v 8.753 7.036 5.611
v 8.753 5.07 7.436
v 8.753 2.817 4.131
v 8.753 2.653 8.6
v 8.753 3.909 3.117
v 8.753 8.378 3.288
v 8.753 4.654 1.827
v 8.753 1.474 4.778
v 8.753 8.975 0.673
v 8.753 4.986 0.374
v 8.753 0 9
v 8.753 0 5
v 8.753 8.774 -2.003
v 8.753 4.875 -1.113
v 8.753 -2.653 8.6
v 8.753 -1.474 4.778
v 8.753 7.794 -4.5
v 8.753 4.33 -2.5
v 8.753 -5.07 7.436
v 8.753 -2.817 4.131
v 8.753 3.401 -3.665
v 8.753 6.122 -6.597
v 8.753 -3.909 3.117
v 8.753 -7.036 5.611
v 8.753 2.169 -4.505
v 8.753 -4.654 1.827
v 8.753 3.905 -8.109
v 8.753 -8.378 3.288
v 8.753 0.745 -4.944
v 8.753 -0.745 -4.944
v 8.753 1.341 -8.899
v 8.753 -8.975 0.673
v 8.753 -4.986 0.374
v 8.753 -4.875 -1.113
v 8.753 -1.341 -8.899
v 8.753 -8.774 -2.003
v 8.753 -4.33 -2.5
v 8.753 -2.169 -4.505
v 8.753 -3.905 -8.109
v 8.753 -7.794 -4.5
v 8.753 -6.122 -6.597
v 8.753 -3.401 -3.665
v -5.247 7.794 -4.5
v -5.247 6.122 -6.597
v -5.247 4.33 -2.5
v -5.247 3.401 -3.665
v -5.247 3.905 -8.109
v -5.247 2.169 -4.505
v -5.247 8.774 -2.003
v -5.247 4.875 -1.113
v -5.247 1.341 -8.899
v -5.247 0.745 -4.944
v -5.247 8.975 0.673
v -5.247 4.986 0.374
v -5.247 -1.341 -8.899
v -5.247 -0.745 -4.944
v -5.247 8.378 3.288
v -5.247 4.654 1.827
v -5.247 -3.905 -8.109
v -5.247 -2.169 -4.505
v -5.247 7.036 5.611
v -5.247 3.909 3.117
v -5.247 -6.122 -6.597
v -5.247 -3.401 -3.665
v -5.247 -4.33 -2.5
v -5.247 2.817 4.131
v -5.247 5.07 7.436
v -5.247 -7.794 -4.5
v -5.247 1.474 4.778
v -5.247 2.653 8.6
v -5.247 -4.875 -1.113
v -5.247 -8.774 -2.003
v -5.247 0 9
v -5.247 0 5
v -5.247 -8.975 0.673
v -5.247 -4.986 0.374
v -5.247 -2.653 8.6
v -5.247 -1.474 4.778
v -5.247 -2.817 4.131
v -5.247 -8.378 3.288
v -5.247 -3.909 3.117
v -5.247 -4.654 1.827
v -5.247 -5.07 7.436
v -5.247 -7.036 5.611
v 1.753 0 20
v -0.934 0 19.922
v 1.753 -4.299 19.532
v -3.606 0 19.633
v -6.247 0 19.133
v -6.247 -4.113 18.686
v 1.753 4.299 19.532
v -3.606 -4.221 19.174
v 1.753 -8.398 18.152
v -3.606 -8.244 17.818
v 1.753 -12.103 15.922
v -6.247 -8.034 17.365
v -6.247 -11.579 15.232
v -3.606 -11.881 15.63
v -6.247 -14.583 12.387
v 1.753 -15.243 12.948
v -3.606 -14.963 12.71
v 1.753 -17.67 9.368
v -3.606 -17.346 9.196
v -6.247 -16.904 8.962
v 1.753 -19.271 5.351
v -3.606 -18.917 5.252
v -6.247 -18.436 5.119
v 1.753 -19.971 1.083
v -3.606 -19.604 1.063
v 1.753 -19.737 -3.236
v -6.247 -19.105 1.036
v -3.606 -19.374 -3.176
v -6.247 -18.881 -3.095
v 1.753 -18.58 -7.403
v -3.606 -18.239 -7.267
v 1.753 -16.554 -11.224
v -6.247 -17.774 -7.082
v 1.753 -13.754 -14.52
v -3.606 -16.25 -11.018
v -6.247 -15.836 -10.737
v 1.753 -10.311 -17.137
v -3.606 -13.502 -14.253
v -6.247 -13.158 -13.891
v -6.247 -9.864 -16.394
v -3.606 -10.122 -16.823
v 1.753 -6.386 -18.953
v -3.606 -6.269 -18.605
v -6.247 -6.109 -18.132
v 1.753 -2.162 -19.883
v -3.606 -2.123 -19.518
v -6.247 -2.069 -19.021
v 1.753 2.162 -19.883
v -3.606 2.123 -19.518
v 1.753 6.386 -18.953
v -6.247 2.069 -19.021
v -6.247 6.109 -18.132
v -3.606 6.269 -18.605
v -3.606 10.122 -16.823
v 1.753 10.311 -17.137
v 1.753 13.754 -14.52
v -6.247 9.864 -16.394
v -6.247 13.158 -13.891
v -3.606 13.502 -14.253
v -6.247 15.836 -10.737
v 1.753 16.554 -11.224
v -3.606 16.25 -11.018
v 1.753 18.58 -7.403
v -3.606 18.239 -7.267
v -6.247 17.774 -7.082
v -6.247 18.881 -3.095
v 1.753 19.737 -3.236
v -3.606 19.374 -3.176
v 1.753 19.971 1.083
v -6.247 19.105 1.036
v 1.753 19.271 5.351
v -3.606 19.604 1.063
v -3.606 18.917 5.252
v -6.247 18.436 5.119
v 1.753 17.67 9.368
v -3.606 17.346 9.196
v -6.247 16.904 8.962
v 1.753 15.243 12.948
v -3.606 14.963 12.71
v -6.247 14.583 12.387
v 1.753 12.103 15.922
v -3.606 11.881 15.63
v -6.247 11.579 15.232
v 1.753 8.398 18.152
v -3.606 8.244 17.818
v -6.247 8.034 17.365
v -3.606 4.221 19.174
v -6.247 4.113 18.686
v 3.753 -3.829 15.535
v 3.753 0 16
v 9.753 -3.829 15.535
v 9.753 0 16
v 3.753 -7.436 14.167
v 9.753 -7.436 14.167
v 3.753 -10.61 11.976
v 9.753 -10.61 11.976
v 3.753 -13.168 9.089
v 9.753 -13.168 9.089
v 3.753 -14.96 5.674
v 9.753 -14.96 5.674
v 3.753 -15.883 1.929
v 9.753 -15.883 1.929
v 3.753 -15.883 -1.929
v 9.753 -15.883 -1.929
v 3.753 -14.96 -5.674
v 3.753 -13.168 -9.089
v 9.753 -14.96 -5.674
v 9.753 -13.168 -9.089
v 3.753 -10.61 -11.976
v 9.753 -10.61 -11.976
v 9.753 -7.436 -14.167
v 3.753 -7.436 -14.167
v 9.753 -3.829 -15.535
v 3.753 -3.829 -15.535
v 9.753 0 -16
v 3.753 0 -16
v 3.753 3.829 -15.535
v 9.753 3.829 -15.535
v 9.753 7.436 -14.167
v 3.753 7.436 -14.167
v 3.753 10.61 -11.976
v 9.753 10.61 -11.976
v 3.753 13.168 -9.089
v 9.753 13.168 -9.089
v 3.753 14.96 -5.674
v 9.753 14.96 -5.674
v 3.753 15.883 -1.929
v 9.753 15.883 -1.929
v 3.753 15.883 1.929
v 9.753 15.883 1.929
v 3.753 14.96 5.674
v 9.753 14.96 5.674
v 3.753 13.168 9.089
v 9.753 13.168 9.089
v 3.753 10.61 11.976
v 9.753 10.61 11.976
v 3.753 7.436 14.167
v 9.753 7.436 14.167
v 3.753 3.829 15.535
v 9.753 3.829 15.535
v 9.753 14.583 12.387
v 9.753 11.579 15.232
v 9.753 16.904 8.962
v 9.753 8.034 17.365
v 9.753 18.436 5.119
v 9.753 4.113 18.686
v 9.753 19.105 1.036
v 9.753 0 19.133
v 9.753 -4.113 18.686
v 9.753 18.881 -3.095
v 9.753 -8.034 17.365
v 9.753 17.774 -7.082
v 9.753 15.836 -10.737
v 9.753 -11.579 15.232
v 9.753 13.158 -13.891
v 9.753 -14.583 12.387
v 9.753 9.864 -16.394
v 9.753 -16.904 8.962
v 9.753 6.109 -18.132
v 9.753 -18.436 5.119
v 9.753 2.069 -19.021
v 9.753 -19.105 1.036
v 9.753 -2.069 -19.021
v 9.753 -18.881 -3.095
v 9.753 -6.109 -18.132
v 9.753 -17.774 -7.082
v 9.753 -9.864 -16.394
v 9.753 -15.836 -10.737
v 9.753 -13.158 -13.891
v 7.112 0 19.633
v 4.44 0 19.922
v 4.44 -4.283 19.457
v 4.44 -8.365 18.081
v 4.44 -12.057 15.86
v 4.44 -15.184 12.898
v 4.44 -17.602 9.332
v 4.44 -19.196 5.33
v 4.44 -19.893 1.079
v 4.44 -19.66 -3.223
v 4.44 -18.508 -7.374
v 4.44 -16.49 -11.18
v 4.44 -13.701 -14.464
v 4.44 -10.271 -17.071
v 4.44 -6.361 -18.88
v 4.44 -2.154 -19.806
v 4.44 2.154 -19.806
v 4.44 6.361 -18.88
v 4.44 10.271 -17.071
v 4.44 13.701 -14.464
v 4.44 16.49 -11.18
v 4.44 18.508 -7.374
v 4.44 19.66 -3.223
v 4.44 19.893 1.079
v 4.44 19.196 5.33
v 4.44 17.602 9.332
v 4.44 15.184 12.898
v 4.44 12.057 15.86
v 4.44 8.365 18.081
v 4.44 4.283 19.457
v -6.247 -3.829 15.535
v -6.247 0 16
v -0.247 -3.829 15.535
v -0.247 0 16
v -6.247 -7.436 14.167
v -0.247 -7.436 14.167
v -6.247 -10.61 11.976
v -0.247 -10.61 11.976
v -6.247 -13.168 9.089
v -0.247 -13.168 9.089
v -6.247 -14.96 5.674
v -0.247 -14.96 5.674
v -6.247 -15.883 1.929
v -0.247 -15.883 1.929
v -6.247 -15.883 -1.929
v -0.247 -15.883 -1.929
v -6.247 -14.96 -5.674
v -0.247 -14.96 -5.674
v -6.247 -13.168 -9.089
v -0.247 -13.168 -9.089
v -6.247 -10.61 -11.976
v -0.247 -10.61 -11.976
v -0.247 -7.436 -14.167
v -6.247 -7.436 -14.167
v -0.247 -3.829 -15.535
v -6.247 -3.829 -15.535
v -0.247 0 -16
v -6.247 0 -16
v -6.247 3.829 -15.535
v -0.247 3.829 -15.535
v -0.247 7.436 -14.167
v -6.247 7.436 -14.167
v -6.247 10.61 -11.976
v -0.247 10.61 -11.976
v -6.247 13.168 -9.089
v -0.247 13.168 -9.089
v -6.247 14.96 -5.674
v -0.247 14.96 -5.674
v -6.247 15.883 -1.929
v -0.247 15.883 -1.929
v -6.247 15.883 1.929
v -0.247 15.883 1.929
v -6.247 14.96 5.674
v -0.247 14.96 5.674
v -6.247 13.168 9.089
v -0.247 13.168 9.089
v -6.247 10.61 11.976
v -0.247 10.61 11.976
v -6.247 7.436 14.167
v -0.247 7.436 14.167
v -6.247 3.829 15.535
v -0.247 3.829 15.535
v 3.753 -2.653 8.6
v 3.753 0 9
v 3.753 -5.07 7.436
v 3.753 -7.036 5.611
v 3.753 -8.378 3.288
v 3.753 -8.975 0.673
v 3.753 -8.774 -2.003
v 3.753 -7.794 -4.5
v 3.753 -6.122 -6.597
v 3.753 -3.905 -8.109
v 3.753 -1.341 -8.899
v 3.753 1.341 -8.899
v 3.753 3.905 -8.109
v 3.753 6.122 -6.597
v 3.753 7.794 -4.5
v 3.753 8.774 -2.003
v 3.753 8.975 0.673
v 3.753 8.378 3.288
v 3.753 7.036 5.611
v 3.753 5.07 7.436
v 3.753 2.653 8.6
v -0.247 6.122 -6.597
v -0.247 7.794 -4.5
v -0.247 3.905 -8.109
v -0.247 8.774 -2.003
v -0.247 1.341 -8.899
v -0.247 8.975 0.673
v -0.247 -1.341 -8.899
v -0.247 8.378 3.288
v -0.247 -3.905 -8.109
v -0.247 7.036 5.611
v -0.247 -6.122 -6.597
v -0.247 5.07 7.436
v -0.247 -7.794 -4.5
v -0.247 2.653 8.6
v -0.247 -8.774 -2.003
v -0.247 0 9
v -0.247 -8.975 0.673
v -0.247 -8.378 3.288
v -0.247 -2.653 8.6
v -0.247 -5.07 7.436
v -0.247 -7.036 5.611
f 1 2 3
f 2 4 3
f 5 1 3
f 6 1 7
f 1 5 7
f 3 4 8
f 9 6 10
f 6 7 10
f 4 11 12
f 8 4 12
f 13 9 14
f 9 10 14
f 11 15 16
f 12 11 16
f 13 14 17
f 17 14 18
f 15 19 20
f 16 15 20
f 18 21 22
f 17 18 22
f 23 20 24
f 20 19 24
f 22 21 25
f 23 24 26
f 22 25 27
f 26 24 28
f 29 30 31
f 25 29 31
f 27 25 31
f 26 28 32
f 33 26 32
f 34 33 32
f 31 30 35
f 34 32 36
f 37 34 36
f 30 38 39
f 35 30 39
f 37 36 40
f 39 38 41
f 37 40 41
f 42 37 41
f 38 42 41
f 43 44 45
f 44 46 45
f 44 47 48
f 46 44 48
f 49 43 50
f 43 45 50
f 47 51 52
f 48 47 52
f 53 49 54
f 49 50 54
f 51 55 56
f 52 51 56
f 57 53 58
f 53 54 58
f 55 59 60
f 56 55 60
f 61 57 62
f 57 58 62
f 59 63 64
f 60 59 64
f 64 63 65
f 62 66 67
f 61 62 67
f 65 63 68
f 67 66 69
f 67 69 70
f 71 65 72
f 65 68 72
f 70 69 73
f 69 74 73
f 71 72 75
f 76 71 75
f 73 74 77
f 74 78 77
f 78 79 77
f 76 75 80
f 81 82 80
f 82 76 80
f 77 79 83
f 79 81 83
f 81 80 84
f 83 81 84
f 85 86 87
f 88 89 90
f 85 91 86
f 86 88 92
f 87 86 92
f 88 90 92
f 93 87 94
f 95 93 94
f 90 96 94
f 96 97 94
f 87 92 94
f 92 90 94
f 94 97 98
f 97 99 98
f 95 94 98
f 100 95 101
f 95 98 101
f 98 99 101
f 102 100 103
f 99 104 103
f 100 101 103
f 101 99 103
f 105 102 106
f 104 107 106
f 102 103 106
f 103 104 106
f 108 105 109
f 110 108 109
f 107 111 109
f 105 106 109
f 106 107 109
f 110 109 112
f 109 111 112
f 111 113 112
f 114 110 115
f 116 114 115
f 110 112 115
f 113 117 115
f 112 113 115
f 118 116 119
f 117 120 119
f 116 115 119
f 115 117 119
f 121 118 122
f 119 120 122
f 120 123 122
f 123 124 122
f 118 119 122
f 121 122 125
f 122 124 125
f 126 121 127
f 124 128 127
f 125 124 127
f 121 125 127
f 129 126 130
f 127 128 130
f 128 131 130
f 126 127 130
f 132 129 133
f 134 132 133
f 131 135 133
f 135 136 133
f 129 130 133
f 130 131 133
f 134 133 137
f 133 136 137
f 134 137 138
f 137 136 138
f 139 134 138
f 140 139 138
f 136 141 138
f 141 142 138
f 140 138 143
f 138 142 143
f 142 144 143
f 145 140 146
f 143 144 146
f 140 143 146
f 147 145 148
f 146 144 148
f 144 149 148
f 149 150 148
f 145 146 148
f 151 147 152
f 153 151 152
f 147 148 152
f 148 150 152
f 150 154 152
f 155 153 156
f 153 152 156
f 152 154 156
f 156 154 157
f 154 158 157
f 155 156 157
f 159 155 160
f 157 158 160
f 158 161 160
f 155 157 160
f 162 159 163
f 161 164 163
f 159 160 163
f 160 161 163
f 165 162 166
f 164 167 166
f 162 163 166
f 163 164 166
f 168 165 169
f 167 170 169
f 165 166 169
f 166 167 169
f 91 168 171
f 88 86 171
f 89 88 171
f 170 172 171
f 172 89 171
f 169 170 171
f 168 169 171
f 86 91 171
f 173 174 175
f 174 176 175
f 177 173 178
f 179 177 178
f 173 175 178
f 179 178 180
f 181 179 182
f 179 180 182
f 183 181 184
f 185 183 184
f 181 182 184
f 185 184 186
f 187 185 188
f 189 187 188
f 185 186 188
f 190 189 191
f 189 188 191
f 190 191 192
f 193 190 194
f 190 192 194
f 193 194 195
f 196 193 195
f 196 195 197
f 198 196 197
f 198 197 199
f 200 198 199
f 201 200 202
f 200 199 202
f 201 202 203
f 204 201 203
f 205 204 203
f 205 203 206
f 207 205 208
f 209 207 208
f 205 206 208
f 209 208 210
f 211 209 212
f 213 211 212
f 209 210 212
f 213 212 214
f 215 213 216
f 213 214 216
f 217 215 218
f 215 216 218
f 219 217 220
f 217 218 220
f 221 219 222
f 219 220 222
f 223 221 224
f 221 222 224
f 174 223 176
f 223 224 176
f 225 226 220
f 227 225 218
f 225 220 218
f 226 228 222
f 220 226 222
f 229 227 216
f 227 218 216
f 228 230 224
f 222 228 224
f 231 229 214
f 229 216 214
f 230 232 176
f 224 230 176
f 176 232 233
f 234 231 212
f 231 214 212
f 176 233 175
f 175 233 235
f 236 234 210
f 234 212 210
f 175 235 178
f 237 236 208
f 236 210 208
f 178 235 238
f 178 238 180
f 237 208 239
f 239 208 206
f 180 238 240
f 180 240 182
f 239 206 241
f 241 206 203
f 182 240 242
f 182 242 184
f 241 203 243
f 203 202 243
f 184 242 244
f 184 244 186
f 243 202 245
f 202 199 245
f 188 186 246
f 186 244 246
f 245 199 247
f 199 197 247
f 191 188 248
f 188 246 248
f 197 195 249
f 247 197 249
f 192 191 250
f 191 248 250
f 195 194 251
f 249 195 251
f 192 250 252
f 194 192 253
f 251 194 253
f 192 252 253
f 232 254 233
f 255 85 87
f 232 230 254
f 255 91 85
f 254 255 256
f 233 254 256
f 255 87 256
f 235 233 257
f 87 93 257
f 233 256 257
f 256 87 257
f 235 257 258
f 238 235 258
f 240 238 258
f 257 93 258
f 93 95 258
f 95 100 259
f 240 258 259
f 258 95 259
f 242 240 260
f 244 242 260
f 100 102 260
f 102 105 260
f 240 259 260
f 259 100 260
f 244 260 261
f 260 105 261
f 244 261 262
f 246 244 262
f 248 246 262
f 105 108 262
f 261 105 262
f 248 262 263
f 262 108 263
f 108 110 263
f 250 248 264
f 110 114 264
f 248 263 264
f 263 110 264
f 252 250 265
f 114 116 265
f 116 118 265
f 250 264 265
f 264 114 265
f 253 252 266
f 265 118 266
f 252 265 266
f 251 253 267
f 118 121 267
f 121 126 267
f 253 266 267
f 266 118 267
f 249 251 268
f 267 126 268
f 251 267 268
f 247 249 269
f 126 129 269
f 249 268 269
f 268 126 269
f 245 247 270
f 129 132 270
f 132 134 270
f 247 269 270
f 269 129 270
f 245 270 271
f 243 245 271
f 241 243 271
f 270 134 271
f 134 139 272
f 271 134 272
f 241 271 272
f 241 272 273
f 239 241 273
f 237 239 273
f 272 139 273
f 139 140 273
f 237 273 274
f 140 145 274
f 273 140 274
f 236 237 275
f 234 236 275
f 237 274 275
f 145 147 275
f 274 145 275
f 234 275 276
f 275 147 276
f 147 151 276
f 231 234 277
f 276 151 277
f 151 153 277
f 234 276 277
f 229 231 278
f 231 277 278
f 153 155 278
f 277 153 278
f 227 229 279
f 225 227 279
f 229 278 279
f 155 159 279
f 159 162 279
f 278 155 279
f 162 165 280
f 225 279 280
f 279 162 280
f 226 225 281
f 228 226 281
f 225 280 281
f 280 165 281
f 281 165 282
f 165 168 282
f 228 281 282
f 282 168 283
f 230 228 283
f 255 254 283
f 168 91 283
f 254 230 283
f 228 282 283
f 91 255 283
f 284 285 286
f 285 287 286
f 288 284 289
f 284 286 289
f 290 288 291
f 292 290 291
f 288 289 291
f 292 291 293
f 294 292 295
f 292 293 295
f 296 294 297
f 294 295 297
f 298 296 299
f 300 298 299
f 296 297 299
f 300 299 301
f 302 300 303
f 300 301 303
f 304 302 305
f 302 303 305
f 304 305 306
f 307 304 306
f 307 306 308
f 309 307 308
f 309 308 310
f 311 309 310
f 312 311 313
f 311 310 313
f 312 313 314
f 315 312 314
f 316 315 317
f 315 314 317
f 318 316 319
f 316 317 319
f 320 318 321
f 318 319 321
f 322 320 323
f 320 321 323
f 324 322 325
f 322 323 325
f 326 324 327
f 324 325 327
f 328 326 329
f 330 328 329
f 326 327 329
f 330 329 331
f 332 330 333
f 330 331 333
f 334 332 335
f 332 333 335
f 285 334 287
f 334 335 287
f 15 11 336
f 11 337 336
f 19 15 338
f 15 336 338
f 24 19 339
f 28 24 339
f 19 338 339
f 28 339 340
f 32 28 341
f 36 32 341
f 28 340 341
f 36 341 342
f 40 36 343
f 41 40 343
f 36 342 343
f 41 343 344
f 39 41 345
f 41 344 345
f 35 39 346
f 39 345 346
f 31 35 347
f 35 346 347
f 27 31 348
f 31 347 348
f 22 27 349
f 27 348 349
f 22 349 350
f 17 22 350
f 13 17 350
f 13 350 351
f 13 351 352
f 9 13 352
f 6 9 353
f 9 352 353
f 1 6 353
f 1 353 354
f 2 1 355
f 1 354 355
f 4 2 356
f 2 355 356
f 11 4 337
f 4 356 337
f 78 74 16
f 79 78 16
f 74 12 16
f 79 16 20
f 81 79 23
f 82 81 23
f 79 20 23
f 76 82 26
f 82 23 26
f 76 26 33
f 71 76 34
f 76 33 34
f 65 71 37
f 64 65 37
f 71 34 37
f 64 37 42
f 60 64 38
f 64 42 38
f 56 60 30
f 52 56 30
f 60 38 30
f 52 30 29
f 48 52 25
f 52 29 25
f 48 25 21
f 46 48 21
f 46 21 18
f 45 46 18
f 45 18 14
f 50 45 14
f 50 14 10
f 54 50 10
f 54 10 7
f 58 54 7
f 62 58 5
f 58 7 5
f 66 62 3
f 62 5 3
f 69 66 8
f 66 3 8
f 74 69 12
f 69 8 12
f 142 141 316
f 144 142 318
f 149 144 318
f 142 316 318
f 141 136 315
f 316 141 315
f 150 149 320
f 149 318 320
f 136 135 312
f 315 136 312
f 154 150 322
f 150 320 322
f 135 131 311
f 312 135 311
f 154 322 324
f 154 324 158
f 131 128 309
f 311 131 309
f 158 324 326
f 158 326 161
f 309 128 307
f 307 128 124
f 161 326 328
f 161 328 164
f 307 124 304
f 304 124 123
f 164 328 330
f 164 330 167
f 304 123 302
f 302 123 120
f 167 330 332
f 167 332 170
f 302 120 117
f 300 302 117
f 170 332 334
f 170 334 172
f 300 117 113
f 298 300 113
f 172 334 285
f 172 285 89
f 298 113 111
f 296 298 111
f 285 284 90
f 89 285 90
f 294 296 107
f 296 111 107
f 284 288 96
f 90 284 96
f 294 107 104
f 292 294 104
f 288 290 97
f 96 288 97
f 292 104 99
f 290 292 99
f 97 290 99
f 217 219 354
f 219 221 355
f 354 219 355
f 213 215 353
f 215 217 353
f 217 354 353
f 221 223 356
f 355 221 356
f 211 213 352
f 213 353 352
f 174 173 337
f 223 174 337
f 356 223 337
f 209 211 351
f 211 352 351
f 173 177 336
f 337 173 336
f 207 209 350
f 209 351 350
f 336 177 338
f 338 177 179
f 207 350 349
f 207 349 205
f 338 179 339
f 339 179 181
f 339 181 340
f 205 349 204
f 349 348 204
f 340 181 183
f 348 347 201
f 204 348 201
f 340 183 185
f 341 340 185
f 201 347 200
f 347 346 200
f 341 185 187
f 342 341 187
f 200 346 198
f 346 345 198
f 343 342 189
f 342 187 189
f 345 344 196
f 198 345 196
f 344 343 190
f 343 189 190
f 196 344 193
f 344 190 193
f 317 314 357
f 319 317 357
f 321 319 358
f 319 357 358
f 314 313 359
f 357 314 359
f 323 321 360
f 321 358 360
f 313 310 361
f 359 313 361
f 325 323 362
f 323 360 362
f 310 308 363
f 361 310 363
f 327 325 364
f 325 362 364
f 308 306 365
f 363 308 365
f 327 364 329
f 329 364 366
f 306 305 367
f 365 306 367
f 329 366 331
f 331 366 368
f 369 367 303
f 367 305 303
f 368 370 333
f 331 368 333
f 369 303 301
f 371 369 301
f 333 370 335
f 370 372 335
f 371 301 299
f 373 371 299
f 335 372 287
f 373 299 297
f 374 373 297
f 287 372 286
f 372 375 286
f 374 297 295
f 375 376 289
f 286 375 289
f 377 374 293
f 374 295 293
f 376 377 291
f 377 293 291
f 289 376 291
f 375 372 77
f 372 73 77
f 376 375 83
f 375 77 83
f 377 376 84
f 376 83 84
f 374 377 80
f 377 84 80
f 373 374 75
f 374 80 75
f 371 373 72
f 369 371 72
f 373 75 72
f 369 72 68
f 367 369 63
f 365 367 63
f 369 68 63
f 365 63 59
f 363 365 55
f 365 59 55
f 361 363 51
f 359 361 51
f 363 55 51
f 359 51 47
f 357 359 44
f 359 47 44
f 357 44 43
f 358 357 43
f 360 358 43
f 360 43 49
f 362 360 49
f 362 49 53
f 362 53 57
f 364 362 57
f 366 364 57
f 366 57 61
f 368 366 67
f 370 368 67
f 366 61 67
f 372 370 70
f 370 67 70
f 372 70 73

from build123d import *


with BuildPart() as part:
    # 草图1 → 旋转1 (revolve)
    with BuildSketch(Plane.XY, mode=Mode.PRIVATE) as revolve_1_sk:
        with BuildLine():
            Line((-5.246753247, 5), (8.753246753, 5))
            Line((8.753246753, 5), (8.753246753, 9))
            Line((8.753246753, 9), (3.753246753, 9))
            Line((3.753246753, 9), (3.753246753, 16))
            Line((3.753246753, 16), (9.753246753, 16))
            Line((9.753246753, 16), (9.753246753, 19.133240235))
            ThreePointArc((9.753246753, 19.133240235), (5.77897928, 19.804125618), (1.753246753, 20))
            ThreePointArc((1.753246753, 20), (-2.272485773, 19.804125618), (-6.246753247, 19.133240235))
            Line((-6.246753247, 19.133240235), (-6.246753247, 16))
            Line((-6.246753247, 16), (-0.246753247, 16))
            Line((-0.246753247, 16), (-0.246753247, 9))
            Line((-0.246753247, 9), (-5.246753247, 9))
            Line((-5.246753247, 9), (-5.246753247, 5))
        make_face()
    revolve(revolve_1_sk.sketch.rotate(Axis((-14.805194805, 0, 0), (1, 0, 0)), 90), axis=Axis((-14.805194805, 0, 0), (1, 0, 0)))


solid = part.part
